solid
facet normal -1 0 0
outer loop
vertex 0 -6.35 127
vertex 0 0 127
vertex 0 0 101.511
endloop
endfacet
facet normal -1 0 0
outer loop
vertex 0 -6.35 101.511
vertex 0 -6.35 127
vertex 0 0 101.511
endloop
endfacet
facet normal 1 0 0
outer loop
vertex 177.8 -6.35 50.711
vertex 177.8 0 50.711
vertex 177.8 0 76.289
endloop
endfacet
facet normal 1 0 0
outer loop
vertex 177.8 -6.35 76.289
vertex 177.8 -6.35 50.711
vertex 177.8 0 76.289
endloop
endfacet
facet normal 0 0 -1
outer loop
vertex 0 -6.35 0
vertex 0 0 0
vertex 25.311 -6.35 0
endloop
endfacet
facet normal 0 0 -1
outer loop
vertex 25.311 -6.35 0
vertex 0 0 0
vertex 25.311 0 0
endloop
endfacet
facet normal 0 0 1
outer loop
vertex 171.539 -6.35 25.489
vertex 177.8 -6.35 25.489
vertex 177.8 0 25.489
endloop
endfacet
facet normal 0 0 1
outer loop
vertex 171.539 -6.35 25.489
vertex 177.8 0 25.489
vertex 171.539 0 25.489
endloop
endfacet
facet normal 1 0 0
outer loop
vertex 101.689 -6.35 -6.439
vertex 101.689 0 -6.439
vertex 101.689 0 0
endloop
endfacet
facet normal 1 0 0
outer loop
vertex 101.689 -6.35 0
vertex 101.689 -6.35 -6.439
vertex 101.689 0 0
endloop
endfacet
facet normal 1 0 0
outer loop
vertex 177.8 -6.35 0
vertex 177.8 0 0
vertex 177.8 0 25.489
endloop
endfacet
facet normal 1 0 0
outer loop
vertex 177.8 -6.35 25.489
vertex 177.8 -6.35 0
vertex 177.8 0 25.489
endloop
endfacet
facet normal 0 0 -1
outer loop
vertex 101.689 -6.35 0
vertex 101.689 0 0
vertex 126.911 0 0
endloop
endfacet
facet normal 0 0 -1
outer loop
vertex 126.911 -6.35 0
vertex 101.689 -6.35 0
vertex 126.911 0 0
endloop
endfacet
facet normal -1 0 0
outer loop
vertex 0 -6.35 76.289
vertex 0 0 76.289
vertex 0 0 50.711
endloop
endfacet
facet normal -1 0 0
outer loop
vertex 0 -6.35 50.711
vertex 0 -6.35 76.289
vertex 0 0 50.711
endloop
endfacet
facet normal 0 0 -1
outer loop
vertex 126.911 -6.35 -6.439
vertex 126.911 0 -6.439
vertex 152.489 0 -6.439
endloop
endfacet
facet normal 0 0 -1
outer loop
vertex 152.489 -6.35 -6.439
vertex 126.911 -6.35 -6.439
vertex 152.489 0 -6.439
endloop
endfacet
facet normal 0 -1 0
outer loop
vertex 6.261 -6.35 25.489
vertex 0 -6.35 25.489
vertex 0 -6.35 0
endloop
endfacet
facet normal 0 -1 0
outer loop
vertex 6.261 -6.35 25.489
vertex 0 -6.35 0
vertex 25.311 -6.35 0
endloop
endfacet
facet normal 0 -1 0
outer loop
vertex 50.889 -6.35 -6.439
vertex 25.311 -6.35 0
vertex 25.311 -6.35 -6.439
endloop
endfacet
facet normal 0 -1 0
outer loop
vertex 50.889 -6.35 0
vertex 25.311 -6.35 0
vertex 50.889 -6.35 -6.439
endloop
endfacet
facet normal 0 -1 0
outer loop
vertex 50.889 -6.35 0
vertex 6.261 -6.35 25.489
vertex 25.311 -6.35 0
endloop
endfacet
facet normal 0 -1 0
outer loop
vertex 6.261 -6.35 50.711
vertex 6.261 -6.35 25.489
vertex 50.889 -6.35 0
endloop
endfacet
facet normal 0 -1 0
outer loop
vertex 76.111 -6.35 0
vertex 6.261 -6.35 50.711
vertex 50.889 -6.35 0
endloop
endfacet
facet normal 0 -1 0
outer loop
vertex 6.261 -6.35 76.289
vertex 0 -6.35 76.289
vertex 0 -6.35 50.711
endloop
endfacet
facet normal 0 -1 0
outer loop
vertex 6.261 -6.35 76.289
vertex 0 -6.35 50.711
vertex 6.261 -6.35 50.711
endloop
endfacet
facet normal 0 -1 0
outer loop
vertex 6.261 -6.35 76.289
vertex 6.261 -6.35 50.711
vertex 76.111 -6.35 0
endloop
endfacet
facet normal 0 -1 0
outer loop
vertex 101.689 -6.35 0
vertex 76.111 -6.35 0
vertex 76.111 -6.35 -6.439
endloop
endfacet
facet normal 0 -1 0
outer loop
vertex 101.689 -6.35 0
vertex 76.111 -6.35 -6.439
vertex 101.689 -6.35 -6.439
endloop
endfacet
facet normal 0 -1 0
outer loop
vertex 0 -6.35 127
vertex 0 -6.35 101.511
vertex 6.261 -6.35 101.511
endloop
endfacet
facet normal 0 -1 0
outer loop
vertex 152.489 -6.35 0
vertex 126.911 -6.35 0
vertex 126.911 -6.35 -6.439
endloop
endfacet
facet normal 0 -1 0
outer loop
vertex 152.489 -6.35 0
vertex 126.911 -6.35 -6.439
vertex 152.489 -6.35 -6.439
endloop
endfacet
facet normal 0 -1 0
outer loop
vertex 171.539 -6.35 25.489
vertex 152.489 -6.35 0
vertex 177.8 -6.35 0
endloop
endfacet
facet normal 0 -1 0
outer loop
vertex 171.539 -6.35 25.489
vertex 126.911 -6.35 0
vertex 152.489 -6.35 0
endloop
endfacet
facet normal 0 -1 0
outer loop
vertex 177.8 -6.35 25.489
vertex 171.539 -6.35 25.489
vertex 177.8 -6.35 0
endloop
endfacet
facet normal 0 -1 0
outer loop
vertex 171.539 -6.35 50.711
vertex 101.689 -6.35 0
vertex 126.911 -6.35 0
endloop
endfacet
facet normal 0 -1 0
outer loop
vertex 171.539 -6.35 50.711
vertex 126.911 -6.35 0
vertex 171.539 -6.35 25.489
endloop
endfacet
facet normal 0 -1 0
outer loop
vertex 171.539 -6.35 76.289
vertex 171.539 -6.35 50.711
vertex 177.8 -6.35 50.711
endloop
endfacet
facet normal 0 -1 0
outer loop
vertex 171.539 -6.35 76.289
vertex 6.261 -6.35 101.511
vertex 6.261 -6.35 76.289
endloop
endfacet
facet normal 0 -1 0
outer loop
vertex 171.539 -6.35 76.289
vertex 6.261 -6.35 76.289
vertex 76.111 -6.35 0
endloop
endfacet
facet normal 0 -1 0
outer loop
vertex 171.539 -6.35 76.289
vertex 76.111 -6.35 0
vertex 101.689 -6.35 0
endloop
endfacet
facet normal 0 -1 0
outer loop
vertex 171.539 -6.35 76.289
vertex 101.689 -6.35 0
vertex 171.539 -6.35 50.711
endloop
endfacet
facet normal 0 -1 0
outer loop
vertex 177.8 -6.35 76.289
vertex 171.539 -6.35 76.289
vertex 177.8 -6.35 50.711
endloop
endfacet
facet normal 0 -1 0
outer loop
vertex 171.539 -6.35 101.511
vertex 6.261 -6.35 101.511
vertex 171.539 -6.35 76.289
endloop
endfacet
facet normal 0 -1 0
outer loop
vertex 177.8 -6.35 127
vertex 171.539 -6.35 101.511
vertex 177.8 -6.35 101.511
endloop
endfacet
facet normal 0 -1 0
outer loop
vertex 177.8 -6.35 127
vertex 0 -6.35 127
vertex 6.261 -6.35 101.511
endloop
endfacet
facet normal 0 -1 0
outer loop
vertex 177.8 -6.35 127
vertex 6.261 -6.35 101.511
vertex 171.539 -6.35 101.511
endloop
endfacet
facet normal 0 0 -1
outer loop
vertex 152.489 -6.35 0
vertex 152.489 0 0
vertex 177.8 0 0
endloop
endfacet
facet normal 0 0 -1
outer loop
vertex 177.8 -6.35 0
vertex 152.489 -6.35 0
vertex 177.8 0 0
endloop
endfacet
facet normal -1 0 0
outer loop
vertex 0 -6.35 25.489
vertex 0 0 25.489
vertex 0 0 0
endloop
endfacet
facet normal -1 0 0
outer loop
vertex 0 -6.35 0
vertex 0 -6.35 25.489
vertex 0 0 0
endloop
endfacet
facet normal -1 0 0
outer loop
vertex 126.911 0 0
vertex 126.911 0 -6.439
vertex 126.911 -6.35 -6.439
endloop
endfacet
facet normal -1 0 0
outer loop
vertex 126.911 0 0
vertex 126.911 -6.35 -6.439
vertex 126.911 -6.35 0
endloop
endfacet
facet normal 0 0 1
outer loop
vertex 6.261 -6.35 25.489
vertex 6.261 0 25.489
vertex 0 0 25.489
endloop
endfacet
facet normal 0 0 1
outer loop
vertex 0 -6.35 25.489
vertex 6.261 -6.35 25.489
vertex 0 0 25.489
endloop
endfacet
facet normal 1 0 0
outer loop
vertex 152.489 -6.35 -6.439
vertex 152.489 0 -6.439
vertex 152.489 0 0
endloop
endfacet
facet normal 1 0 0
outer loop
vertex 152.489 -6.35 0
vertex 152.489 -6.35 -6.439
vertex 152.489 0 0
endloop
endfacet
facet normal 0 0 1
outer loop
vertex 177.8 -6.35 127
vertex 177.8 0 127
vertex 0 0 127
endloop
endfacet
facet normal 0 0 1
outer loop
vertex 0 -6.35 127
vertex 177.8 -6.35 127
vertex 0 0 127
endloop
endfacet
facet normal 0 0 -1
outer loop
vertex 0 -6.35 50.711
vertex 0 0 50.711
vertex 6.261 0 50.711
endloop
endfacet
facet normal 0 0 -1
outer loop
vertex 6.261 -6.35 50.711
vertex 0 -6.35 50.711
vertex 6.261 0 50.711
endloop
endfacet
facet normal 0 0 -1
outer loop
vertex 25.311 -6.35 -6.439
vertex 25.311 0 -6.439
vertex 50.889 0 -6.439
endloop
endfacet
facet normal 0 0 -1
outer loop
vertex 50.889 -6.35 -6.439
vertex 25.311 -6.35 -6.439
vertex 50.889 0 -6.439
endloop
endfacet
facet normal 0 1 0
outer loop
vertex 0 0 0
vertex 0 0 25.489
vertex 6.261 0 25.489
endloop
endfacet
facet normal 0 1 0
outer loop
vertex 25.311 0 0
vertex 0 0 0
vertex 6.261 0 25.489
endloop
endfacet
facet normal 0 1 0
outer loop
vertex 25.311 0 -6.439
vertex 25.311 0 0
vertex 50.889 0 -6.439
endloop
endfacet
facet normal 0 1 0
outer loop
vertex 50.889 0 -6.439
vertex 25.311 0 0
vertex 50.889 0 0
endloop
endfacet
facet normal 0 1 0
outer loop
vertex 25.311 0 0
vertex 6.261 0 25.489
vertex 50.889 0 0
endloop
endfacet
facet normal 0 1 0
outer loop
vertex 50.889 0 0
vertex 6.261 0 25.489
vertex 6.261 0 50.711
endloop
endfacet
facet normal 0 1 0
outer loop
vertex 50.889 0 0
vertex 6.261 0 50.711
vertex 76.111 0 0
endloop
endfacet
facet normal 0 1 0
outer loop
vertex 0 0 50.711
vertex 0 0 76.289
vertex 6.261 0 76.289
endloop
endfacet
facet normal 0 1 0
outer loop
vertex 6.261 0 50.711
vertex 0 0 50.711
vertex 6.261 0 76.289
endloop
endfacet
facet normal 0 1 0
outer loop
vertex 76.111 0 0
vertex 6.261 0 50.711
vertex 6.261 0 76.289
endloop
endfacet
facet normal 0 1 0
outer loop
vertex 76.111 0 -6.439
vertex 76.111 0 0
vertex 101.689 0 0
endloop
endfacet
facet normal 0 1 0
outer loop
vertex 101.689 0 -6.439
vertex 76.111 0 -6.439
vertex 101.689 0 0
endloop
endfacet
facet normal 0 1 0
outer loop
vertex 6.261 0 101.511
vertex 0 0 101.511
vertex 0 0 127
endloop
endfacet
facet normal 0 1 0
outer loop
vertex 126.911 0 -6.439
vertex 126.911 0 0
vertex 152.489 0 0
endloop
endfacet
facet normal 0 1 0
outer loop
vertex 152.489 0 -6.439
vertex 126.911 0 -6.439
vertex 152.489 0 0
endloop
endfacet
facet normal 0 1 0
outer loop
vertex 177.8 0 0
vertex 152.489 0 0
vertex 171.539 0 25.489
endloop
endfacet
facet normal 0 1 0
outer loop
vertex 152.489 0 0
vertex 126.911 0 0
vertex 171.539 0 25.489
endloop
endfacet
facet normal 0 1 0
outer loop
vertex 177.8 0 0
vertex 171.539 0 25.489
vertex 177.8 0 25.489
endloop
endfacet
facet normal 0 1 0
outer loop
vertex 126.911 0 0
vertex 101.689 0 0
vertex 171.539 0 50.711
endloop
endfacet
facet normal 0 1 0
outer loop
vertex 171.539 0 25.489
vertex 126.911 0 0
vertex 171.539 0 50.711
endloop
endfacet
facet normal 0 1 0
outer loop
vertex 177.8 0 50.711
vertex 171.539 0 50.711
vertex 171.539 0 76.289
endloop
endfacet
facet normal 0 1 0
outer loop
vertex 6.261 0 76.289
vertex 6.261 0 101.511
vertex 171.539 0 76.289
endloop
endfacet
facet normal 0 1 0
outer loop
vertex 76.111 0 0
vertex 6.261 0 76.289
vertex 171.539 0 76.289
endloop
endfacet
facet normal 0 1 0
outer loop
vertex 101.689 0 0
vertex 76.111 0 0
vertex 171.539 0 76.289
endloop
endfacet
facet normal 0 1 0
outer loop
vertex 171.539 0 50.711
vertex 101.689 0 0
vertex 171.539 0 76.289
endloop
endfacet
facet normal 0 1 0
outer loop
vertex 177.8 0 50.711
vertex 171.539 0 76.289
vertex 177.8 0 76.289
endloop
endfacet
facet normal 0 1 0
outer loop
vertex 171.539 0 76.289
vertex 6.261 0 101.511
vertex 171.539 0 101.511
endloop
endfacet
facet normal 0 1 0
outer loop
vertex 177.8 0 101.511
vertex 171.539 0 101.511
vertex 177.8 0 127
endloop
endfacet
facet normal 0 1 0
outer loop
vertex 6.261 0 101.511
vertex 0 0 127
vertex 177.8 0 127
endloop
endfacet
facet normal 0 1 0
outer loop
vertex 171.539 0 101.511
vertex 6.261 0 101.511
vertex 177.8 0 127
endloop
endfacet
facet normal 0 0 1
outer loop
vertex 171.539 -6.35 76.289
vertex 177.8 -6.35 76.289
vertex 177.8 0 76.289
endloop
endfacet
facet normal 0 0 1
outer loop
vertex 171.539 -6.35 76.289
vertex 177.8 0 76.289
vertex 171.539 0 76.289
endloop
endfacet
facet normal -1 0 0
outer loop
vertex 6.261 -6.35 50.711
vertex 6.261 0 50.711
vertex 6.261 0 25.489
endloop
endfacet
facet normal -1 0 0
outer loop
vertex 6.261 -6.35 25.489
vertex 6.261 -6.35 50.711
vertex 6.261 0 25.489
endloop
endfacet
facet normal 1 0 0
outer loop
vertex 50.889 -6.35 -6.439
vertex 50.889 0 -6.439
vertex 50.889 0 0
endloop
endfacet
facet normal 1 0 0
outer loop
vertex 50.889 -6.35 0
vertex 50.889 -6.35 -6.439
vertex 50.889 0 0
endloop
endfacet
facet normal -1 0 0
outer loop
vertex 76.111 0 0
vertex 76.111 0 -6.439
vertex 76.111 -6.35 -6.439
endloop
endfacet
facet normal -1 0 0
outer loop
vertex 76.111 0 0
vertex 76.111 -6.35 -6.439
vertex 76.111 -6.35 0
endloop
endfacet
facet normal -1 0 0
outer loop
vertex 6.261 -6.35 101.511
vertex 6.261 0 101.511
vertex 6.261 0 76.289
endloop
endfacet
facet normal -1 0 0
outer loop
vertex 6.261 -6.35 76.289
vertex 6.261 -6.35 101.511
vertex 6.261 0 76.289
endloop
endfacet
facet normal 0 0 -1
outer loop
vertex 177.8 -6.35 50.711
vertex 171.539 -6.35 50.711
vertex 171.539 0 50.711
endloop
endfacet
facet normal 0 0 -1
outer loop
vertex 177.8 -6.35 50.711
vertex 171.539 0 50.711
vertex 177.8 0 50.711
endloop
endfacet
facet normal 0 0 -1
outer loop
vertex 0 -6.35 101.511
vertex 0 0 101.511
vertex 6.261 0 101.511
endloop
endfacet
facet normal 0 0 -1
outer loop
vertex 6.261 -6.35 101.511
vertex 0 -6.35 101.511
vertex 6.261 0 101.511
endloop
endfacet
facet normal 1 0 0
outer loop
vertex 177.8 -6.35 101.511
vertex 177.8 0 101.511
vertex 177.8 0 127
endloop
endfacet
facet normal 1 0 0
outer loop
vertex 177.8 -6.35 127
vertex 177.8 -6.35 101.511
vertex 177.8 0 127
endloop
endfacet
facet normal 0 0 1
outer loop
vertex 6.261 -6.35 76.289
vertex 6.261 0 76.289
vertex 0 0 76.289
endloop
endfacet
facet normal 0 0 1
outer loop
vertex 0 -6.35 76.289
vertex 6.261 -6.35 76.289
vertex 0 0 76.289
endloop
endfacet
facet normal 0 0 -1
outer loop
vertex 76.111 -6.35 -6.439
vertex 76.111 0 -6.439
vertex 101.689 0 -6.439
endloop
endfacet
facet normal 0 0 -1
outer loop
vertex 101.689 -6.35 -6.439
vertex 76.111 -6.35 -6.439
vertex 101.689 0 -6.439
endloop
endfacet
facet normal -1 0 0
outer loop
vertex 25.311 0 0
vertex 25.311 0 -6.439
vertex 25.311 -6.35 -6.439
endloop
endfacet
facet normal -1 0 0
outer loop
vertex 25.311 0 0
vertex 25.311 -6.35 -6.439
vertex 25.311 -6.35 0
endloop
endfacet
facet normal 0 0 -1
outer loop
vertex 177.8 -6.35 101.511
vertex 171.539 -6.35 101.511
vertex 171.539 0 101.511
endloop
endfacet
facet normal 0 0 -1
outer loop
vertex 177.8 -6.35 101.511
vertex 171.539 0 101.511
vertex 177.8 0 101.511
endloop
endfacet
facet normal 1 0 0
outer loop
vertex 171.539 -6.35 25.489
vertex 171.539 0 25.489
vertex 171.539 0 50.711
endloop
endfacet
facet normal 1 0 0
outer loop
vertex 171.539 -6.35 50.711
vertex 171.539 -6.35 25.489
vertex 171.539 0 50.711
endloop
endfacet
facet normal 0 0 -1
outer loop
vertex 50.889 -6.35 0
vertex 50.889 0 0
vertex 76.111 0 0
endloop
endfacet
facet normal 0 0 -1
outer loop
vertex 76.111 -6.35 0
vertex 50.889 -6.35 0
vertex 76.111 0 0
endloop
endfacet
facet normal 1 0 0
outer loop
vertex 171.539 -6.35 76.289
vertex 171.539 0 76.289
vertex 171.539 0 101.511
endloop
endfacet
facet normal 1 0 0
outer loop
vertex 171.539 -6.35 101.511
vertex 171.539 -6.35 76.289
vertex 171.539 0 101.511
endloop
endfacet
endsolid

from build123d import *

# Parameters (mm, degrees)
F0_W     = 25.5778
F0_H     = 6.4389
F1_DEPTH = 6.35


with BuildPart() as f1:
    # F0 (on Front) → F1 (new body)
    with BuildSketch(Plane.XZ):
        Polygon((0, 25.4889), (0, 0), (25.3111, 0), (50.8889, 0), (76.1111, 0), (101.6889, 0), (126.9111, 0), (152.4889, 0), (177.8, 0), (177.8, 25.4889), (171.5389, 25.4889), (171.5389, 50.7111), (177.8, 50.7111), (177.8, 76.2889), (171.5389, 76.2889), (171.5389, 101.5111), (177.8, 101.5111), (177.8, 127), (0, 127), (0, 101.5111), (6.2611, 101.5111), (6.2611, 76.2889), (0, 76.2889), (0, 50.7111), (6.2611, 50.7111), (6.2611, 25.4889), align=None)
        with Locations((38.1, -3.21945)):
            Rectangle(F0_W, F0_H)
        with Locations((88.9, -3.21945)):
            Rectangle(F0_W, F0_H)
        with Locations((139.7, -3.21945)):
            Rectangle(F0_W, F0_H)
    extrude(amount=F1_DEPTH)


solid = f1.part
